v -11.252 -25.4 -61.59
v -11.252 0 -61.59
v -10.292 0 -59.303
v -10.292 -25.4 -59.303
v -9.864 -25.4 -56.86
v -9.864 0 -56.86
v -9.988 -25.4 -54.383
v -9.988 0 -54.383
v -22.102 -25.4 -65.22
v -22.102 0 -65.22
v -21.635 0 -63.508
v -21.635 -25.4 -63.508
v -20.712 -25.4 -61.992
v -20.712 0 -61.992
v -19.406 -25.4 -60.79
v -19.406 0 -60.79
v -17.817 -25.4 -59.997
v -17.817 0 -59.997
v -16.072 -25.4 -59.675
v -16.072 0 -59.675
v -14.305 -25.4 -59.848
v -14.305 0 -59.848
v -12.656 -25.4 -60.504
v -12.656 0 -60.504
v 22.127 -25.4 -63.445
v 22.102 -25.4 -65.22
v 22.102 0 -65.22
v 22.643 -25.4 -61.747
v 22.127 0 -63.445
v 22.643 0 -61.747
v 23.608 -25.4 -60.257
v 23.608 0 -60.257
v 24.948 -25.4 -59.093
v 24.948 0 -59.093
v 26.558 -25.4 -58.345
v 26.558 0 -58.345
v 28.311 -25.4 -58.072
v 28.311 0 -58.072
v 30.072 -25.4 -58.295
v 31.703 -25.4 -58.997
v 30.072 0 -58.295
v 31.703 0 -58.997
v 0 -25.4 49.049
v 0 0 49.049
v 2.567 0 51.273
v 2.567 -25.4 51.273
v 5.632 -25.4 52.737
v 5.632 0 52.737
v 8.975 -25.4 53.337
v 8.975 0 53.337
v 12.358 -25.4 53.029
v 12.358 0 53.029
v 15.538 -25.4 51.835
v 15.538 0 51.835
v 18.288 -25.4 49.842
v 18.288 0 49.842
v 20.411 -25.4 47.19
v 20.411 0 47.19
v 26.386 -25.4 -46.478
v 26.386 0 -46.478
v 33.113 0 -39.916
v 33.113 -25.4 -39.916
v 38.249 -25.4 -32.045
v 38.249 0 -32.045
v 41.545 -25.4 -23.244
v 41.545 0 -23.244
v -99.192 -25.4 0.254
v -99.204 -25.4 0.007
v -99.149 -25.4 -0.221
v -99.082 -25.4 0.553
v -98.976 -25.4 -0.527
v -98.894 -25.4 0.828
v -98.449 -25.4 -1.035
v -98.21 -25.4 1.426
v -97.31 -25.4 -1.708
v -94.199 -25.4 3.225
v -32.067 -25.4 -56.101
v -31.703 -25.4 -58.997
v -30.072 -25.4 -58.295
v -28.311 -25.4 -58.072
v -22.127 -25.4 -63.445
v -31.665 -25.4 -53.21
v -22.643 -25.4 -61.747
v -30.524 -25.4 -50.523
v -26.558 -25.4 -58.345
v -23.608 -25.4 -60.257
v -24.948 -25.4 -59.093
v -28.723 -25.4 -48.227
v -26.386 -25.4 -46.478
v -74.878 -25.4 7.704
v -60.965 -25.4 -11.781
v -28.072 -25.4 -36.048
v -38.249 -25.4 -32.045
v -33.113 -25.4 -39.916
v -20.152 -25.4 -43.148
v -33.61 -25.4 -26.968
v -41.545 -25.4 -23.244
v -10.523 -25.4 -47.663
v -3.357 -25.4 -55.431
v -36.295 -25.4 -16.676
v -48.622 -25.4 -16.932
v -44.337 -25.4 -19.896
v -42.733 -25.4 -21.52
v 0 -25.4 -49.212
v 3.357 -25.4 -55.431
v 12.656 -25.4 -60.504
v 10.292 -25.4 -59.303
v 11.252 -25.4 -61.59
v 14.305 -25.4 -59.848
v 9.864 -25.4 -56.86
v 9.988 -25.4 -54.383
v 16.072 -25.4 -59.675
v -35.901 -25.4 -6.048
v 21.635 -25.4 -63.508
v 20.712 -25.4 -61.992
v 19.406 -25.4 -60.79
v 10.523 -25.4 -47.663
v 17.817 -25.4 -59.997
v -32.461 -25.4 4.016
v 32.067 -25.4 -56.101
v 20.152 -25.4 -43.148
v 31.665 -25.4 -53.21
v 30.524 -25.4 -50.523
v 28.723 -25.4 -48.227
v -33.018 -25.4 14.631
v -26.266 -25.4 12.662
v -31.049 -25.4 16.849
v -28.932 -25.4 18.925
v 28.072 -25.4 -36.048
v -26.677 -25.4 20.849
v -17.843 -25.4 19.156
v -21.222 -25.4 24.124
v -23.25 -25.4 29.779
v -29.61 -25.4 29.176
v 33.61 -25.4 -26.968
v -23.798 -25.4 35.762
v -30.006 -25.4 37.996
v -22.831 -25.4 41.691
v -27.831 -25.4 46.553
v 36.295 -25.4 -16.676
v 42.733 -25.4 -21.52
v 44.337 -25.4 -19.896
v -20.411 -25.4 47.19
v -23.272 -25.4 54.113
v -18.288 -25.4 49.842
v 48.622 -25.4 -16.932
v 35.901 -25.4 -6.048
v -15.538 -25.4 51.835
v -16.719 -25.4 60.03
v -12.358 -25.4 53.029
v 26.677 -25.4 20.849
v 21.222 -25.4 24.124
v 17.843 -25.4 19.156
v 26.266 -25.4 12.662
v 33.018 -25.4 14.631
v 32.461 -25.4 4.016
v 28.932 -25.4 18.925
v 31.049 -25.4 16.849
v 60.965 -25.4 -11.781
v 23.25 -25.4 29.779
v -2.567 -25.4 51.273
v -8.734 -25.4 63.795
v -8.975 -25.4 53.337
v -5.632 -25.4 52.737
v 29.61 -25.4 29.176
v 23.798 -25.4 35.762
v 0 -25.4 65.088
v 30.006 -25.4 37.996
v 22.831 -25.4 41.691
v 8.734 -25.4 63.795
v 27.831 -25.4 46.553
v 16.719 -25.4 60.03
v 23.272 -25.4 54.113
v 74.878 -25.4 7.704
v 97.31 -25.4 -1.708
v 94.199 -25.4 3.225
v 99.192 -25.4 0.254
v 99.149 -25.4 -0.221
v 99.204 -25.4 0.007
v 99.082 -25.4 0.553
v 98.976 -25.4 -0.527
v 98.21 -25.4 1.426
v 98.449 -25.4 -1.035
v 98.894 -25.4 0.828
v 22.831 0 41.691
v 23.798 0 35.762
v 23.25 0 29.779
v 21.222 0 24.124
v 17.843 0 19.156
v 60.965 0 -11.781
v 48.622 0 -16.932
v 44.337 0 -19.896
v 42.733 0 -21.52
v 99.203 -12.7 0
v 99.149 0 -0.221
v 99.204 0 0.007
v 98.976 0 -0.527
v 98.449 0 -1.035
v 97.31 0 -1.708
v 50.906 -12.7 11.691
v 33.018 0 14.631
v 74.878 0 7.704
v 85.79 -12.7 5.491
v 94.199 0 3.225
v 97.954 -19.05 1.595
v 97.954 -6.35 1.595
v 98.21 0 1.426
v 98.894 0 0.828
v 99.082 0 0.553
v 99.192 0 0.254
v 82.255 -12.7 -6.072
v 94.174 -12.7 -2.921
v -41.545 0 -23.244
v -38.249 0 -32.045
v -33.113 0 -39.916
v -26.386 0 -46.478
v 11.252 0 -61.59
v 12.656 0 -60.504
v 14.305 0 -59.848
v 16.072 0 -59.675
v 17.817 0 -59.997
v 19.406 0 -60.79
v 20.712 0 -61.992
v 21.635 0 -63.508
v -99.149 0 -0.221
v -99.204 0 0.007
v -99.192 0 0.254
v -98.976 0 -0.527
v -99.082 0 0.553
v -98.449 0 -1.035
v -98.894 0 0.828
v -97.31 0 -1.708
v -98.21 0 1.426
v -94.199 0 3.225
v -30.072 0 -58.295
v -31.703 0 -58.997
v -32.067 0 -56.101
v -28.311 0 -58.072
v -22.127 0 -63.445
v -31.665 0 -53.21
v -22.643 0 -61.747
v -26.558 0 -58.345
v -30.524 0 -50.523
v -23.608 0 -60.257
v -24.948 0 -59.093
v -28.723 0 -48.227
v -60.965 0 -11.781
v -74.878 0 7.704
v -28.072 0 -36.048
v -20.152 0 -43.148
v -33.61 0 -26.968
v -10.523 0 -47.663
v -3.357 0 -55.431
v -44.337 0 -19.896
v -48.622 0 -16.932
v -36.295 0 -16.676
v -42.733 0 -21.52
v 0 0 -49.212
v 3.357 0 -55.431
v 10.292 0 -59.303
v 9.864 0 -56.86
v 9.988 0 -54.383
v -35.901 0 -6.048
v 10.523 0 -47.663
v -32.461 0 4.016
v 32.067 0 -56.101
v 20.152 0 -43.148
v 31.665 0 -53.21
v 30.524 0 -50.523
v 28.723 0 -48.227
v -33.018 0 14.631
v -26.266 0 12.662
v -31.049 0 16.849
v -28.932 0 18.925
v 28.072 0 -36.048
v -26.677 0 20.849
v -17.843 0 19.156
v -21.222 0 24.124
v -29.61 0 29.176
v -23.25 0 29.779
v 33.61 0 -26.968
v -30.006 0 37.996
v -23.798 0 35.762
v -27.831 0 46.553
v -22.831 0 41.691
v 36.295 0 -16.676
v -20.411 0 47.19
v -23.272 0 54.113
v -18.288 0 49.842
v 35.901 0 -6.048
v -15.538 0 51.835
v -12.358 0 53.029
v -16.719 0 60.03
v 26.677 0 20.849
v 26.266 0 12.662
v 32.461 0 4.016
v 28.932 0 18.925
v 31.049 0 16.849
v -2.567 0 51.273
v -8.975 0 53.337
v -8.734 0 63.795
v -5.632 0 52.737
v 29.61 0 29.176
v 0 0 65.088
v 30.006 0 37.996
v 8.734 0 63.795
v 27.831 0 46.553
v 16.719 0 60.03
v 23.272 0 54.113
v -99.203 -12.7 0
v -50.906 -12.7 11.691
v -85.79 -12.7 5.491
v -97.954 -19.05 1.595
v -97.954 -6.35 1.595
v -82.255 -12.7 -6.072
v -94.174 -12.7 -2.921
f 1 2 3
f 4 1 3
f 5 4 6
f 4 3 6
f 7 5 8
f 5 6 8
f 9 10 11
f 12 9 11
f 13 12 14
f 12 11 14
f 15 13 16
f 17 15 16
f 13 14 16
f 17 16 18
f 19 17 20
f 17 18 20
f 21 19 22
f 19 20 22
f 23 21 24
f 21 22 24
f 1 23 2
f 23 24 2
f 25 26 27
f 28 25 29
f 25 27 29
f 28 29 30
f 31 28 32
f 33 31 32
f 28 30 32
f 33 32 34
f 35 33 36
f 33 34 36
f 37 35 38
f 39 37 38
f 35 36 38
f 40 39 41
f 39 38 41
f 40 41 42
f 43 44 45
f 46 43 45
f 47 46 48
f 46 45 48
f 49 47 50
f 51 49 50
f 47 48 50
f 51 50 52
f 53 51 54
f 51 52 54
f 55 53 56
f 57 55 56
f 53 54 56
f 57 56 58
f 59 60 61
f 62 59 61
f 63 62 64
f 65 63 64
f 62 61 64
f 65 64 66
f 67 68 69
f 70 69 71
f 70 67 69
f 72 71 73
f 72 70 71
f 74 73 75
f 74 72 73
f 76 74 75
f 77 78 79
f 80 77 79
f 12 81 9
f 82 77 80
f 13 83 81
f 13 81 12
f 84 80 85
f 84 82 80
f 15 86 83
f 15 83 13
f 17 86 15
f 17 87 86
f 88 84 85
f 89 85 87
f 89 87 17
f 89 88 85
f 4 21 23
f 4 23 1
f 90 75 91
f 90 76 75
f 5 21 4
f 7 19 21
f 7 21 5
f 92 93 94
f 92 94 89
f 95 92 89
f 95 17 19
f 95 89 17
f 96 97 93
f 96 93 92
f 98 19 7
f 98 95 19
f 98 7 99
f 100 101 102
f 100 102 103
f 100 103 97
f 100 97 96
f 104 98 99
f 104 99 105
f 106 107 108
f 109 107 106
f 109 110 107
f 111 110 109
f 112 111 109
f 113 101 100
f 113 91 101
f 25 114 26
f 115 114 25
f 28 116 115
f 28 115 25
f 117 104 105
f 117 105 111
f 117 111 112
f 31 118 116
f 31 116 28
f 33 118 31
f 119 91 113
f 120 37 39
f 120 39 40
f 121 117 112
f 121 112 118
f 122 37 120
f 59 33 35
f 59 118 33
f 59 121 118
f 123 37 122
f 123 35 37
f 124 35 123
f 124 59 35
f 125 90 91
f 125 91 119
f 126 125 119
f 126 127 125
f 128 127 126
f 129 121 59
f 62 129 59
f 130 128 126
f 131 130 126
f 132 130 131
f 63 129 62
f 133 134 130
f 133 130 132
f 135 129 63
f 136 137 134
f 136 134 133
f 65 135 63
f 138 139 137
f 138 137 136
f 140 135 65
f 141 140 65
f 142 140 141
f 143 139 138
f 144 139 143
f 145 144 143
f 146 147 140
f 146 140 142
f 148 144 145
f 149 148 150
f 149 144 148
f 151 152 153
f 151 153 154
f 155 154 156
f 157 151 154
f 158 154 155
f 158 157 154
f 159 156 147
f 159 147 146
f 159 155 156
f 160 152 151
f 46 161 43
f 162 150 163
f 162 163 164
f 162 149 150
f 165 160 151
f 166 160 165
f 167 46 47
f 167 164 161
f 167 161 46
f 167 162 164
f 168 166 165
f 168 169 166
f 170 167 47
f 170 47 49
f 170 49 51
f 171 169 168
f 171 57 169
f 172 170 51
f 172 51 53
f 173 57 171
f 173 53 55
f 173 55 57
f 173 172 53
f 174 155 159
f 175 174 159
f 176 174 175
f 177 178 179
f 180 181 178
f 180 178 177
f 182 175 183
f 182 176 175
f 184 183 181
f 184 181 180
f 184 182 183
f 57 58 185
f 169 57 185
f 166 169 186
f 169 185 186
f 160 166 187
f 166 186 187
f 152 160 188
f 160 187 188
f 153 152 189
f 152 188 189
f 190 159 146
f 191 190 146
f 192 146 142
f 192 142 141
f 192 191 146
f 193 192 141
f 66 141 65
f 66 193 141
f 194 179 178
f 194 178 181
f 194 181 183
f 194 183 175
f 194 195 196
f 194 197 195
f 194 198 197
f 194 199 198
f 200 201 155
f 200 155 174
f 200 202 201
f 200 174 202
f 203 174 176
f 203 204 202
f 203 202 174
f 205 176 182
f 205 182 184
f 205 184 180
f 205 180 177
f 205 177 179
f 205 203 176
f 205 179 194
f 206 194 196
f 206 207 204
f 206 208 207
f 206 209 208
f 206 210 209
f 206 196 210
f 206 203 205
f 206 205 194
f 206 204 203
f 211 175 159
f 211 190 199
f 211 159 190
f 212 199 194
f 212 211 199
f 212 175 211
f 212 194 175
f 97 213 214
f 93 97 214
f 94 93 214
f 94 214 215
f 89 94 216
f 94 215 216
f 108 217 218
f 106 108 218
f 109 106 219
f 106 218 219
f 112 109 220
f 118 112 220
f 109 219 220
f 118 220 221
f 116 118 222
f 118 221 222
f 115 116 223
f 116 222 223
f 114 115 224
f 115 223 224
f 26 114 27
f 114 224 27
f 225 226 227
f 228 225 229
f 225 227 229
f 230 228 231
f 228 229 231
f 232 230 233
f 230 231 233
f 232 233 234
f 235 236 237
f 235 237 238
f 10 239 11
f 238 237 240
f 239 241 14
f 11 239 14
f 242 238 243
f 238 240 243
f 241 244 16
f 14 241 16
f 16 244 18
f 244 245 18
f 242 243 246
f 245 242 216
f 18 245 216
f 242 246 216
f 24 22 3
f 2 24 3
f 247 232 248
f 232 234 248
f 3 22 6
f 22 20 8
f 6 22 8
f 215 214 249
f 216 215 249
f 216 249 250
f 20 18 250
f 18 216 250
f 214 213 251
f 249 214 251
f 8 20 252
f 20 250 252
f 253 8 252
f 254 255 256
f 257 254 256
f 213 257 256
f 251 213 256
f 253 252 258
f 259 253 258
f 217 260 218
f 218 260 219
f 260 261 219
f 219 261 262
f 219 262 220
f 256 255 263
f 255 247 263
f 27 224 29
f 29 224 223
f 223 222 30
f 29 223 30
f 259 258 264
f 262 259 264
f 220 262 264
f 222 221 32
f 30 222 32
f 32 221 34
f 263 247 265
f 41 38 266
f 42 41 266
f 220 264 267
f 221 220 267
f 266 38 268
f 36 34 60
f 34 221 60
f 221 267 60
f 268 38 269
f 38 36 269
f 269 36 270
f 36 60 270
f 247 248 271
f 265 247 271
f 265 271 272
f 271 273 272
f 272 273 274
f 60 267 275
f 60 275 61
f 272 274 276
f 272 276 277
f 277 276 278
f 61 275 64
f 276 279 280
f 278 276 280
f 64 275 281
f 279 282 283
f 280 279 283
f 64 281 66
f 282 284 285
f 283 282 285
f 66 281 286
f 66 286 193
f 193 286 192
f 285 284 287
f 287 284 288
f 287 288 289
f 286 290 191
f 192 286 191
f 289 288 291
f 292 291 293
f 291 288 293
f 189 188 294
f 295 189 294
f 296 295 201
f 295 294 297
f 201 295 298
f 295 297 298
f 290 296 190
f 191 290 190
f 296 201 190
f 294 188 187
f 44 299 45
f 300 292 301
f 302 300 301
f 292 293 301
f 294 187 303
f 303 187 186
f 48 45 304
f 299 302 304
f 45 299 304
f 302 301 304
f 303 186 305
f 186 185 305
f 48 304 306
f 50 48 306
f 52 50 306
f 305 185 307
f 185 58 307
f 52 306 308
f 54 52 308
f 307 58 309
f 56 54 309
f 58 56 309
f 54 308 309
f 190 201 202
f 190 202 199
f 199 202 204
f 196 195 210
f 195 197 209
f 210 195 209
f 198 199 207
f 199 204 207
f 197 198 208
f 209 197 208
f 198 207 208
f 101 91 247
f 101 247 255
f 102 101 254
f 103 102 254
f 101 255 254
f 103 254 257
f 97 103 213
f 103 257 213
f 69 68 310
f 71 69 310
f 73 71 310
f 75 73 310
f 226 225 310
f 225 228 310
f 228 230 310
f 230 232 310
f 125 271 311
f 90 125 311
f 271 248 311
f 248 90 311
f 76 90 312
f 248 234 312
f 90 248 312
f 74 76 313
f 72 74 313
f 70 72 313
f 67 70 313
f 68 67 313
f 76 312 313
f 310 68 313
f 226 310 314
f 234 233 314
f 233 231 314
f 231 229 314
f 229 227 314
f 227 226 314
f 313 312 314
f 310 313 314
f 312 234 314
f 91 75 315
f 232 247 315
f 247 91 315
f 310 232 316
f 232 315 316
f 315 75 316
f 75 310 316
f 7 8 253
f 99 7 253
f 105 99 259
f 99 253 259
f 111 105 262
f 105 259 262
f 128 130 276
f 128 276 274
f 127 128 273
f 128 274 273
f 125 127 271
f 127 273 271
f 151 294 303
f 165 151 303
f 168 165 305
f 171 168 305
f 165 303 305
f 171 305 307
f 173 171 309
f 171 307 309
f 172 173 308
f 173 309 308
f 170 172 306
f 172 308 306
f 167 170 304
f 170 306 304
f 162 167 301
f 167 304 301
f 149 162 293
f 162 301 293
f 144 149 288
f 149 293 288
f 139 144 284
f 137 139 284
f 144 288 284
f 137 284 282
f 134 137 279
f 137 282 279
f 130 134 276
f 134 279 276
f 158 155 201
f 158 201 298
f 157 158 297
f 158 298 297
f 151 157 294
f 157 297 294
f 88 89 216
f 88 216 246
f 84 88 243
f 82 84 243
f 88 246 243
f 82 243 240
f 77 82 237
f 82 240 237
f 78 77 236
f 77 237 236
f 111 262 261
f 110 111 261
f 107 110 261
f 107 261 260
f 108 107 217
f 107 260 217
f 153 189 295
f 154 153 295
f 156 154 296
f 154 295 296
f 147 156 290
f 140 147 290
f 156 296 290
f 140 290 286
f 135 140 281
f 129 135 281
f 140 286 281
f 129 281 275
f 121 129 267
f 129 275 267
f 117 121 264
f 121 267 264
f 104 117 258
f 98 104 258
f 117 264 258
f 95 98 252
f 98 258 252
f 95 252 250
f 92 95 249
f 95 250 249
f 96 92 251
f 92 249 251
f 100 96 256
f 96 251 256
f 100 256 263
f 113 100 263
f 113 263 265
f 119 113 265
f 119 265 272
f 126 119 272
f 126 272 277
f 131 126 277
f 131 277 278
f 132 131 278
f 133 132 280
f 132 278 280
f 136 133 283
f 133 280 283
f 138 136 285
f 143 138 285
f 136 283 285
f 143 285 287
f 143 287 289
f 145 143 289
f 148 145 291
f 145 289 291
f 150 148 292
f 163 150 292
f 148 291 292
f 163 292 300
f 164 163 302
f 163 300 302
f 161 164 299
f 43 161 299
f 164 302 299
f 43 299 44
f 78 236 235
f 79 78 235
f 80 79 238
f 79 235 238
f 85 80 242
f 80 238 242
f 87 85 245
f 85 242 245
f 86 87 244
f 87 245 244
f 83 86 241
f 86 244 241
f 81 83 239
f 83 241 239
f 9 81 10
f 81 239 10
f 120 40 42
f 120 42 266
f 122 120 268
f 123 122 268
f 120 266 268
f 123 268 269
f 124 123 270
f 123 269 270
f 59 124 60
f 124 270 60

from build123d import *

# Parameters (mm, degrees)
F1_DEPTH = 25.4


# Not quite as in the source:
# - a feature names something its author has since deleted; it is built from what else it names


with BuildPart() as f1:
    # F0 (on Front) → F1 (new body)
    with BuildSketch(Plane.XZ):
        with BuildLine():
            ThreePointArc((33.018049972, 14.6313424898), (30.0088601414, 17.9049378249), (26.6767187304, 20.8491666667))
            ThreePointArc((26.6767187304, 20.8491666667), (0, 65.0875), (-26.6767187304, 20.8491666667))
            ThreePointArc((-26.6767187304, 20.8491666667), (-30.0088601414, 17.9049378249), (-33.018049972, 14.6313424898))
            ThreePointArc((-33.018049972, 14.6313424898), (-41.8158398527, -3.2856787995), (-41.5452899235, -23.2443250813))
            ThreePointArc((-41.5452899235, -23.2443250813), (-35.8973631324, -36.1216401303), (-26.3860544261, -46.4782480018))
            ThreePointArc((-26.3860544261, -46.4782480018), (-18.6113486842, -51.3110295952), (-9.9877042304, -54.3826063299))
            ThreePointArc((-9.9877042304, -54.3826063299), (0, -55.5625), (9.9877042304, -54.3826063299))
            ThreePointArc((9.9877042304, -54.3826063299), (18.6113486842, -51.3110295952), (26.3860544261, -46.4782480018))
            ThreePointArc((26.3860544261, -46.4782480018), (35.8973631324, -36.1216401303), (41.5452899235, -23.2443250813))
            ThreePointArc((41.5452899235, -23.2443250813), (41.8158398527, -3.2856787995), (33.018049972, 14.6313424898))
        make_face()
        with BuildLine():
            ThreePointArc((20.4107142857, 47.190312821), (23.7132340956, 32.7529767549), (17.8428848253, 19.1558333333))
            ThreePointArc((17.8428848253, 19.1558333333), (0, -49.2125), (-17.8428848253, 19.1558333333))
            ThreePointArc((-17.8428848253, 19.1558333333), (-23.7132340956, 32.7529767549), (-20.4107142857, 47.190312821))
            ThreePointArc((-20.4107142857, 47.190312821), (-10.6767956636, 53.2964751512), (0, 49.0490730624))
            ThreePointArc((0, 49.0490730624), (10.6767956636, 53.2964751512), (20.4107142857, 47.190312821))
        make_face(mode=Mode.SUBTRACT)
        with BuildLine():
            ThreePointArc((31.7028005699, -58.996710055), (31.1832359324, -51.8291005513), (26.3860544261, -46.4782480018))
            ThreePointArc((26.3860544261, -46.4782480018), (18.6113486842, -51.3110295952), (9.9877042304, -54.3826063299))
            ThreePointArc((9.9877042304, -54.3826063299), (10.009677281, -58.0934630853), (11.2522370234, -61.5901738197))
            ThreePointArc((11.2522370234, -61.5901738197), (17.8174676094, -59.9971626047), (22.102310986, -65.220193776))
            ThreePointArc((22.102310986, -65.220193776), (24.9477521066, -59.0929266684), (31.7028005699, -58.996710055))
        make_face()
        with BuildLine():
            ThreePointArc((-9.9877042304, -54.3826063299), (-18.6113486842, -51.3110295952), (-26.3860544261, -46.4782480018))
            ThreePointArc((-26.3860544261, -46.4782480018), (-31.1832359324, -51.8291005513), (-31.7028005699, -58.996710055))
            ThreePointArc((-31.7028005699, -58.996710055), (-24.9477521066, -59.0929266684), (-22.102310986, -65.220193776))
            ThreePointArc((-22.102310986, -65.220193776), (-17.8174676094, -59.9971626047), (-11.2522370234, -61.5901738197))
            ThreePointArc((-11.2522370234, -61.5901738197), (-10.009677281, -58.0934630853), (-9.9877042304, -54.3826063299))
        make_face()
        with BuildLine():
            add(Edge.make_bspline(
                [(33.018049972, 14.6313424898), (46.9965733011, 11.8619536122), (150.360470689, -0.7954577234), (49.0987253283, -9.3555527531), (41.5452899235, -23.2443250813)],
                knots=[0, 0, 0, 0, 0.5108094749, 1, 1, 1, 1], degree=3))
            ThreePointArc((33.018049972, 14.6313424898), (41.8158398527, -3.2856787995), (41.5452899235, -23.2443250813))
        make_face()
        with BuildLine():
            ThreePointArc((-41.5452899235, -23.2443250813), (-41.8158398527, -3.2856787995), (-33.018049972, 14.6313424898))
            add(Edge.make_bspline(
                [(-33.018049972, 14.6313424898), (-46.9965733011, 11.8619536122), (-150.360470689, -0.7954577234), (-49.0987253283, -9.3555527531), (-41.5452899235, -23.2443250813)],
                knots=[0, 0, 0, 0, 0.5108094749, 1, 1, 1, 1], degree=3))
        make_face()
    extrude(amount=F1_DEPTH)


solid = f1.part
